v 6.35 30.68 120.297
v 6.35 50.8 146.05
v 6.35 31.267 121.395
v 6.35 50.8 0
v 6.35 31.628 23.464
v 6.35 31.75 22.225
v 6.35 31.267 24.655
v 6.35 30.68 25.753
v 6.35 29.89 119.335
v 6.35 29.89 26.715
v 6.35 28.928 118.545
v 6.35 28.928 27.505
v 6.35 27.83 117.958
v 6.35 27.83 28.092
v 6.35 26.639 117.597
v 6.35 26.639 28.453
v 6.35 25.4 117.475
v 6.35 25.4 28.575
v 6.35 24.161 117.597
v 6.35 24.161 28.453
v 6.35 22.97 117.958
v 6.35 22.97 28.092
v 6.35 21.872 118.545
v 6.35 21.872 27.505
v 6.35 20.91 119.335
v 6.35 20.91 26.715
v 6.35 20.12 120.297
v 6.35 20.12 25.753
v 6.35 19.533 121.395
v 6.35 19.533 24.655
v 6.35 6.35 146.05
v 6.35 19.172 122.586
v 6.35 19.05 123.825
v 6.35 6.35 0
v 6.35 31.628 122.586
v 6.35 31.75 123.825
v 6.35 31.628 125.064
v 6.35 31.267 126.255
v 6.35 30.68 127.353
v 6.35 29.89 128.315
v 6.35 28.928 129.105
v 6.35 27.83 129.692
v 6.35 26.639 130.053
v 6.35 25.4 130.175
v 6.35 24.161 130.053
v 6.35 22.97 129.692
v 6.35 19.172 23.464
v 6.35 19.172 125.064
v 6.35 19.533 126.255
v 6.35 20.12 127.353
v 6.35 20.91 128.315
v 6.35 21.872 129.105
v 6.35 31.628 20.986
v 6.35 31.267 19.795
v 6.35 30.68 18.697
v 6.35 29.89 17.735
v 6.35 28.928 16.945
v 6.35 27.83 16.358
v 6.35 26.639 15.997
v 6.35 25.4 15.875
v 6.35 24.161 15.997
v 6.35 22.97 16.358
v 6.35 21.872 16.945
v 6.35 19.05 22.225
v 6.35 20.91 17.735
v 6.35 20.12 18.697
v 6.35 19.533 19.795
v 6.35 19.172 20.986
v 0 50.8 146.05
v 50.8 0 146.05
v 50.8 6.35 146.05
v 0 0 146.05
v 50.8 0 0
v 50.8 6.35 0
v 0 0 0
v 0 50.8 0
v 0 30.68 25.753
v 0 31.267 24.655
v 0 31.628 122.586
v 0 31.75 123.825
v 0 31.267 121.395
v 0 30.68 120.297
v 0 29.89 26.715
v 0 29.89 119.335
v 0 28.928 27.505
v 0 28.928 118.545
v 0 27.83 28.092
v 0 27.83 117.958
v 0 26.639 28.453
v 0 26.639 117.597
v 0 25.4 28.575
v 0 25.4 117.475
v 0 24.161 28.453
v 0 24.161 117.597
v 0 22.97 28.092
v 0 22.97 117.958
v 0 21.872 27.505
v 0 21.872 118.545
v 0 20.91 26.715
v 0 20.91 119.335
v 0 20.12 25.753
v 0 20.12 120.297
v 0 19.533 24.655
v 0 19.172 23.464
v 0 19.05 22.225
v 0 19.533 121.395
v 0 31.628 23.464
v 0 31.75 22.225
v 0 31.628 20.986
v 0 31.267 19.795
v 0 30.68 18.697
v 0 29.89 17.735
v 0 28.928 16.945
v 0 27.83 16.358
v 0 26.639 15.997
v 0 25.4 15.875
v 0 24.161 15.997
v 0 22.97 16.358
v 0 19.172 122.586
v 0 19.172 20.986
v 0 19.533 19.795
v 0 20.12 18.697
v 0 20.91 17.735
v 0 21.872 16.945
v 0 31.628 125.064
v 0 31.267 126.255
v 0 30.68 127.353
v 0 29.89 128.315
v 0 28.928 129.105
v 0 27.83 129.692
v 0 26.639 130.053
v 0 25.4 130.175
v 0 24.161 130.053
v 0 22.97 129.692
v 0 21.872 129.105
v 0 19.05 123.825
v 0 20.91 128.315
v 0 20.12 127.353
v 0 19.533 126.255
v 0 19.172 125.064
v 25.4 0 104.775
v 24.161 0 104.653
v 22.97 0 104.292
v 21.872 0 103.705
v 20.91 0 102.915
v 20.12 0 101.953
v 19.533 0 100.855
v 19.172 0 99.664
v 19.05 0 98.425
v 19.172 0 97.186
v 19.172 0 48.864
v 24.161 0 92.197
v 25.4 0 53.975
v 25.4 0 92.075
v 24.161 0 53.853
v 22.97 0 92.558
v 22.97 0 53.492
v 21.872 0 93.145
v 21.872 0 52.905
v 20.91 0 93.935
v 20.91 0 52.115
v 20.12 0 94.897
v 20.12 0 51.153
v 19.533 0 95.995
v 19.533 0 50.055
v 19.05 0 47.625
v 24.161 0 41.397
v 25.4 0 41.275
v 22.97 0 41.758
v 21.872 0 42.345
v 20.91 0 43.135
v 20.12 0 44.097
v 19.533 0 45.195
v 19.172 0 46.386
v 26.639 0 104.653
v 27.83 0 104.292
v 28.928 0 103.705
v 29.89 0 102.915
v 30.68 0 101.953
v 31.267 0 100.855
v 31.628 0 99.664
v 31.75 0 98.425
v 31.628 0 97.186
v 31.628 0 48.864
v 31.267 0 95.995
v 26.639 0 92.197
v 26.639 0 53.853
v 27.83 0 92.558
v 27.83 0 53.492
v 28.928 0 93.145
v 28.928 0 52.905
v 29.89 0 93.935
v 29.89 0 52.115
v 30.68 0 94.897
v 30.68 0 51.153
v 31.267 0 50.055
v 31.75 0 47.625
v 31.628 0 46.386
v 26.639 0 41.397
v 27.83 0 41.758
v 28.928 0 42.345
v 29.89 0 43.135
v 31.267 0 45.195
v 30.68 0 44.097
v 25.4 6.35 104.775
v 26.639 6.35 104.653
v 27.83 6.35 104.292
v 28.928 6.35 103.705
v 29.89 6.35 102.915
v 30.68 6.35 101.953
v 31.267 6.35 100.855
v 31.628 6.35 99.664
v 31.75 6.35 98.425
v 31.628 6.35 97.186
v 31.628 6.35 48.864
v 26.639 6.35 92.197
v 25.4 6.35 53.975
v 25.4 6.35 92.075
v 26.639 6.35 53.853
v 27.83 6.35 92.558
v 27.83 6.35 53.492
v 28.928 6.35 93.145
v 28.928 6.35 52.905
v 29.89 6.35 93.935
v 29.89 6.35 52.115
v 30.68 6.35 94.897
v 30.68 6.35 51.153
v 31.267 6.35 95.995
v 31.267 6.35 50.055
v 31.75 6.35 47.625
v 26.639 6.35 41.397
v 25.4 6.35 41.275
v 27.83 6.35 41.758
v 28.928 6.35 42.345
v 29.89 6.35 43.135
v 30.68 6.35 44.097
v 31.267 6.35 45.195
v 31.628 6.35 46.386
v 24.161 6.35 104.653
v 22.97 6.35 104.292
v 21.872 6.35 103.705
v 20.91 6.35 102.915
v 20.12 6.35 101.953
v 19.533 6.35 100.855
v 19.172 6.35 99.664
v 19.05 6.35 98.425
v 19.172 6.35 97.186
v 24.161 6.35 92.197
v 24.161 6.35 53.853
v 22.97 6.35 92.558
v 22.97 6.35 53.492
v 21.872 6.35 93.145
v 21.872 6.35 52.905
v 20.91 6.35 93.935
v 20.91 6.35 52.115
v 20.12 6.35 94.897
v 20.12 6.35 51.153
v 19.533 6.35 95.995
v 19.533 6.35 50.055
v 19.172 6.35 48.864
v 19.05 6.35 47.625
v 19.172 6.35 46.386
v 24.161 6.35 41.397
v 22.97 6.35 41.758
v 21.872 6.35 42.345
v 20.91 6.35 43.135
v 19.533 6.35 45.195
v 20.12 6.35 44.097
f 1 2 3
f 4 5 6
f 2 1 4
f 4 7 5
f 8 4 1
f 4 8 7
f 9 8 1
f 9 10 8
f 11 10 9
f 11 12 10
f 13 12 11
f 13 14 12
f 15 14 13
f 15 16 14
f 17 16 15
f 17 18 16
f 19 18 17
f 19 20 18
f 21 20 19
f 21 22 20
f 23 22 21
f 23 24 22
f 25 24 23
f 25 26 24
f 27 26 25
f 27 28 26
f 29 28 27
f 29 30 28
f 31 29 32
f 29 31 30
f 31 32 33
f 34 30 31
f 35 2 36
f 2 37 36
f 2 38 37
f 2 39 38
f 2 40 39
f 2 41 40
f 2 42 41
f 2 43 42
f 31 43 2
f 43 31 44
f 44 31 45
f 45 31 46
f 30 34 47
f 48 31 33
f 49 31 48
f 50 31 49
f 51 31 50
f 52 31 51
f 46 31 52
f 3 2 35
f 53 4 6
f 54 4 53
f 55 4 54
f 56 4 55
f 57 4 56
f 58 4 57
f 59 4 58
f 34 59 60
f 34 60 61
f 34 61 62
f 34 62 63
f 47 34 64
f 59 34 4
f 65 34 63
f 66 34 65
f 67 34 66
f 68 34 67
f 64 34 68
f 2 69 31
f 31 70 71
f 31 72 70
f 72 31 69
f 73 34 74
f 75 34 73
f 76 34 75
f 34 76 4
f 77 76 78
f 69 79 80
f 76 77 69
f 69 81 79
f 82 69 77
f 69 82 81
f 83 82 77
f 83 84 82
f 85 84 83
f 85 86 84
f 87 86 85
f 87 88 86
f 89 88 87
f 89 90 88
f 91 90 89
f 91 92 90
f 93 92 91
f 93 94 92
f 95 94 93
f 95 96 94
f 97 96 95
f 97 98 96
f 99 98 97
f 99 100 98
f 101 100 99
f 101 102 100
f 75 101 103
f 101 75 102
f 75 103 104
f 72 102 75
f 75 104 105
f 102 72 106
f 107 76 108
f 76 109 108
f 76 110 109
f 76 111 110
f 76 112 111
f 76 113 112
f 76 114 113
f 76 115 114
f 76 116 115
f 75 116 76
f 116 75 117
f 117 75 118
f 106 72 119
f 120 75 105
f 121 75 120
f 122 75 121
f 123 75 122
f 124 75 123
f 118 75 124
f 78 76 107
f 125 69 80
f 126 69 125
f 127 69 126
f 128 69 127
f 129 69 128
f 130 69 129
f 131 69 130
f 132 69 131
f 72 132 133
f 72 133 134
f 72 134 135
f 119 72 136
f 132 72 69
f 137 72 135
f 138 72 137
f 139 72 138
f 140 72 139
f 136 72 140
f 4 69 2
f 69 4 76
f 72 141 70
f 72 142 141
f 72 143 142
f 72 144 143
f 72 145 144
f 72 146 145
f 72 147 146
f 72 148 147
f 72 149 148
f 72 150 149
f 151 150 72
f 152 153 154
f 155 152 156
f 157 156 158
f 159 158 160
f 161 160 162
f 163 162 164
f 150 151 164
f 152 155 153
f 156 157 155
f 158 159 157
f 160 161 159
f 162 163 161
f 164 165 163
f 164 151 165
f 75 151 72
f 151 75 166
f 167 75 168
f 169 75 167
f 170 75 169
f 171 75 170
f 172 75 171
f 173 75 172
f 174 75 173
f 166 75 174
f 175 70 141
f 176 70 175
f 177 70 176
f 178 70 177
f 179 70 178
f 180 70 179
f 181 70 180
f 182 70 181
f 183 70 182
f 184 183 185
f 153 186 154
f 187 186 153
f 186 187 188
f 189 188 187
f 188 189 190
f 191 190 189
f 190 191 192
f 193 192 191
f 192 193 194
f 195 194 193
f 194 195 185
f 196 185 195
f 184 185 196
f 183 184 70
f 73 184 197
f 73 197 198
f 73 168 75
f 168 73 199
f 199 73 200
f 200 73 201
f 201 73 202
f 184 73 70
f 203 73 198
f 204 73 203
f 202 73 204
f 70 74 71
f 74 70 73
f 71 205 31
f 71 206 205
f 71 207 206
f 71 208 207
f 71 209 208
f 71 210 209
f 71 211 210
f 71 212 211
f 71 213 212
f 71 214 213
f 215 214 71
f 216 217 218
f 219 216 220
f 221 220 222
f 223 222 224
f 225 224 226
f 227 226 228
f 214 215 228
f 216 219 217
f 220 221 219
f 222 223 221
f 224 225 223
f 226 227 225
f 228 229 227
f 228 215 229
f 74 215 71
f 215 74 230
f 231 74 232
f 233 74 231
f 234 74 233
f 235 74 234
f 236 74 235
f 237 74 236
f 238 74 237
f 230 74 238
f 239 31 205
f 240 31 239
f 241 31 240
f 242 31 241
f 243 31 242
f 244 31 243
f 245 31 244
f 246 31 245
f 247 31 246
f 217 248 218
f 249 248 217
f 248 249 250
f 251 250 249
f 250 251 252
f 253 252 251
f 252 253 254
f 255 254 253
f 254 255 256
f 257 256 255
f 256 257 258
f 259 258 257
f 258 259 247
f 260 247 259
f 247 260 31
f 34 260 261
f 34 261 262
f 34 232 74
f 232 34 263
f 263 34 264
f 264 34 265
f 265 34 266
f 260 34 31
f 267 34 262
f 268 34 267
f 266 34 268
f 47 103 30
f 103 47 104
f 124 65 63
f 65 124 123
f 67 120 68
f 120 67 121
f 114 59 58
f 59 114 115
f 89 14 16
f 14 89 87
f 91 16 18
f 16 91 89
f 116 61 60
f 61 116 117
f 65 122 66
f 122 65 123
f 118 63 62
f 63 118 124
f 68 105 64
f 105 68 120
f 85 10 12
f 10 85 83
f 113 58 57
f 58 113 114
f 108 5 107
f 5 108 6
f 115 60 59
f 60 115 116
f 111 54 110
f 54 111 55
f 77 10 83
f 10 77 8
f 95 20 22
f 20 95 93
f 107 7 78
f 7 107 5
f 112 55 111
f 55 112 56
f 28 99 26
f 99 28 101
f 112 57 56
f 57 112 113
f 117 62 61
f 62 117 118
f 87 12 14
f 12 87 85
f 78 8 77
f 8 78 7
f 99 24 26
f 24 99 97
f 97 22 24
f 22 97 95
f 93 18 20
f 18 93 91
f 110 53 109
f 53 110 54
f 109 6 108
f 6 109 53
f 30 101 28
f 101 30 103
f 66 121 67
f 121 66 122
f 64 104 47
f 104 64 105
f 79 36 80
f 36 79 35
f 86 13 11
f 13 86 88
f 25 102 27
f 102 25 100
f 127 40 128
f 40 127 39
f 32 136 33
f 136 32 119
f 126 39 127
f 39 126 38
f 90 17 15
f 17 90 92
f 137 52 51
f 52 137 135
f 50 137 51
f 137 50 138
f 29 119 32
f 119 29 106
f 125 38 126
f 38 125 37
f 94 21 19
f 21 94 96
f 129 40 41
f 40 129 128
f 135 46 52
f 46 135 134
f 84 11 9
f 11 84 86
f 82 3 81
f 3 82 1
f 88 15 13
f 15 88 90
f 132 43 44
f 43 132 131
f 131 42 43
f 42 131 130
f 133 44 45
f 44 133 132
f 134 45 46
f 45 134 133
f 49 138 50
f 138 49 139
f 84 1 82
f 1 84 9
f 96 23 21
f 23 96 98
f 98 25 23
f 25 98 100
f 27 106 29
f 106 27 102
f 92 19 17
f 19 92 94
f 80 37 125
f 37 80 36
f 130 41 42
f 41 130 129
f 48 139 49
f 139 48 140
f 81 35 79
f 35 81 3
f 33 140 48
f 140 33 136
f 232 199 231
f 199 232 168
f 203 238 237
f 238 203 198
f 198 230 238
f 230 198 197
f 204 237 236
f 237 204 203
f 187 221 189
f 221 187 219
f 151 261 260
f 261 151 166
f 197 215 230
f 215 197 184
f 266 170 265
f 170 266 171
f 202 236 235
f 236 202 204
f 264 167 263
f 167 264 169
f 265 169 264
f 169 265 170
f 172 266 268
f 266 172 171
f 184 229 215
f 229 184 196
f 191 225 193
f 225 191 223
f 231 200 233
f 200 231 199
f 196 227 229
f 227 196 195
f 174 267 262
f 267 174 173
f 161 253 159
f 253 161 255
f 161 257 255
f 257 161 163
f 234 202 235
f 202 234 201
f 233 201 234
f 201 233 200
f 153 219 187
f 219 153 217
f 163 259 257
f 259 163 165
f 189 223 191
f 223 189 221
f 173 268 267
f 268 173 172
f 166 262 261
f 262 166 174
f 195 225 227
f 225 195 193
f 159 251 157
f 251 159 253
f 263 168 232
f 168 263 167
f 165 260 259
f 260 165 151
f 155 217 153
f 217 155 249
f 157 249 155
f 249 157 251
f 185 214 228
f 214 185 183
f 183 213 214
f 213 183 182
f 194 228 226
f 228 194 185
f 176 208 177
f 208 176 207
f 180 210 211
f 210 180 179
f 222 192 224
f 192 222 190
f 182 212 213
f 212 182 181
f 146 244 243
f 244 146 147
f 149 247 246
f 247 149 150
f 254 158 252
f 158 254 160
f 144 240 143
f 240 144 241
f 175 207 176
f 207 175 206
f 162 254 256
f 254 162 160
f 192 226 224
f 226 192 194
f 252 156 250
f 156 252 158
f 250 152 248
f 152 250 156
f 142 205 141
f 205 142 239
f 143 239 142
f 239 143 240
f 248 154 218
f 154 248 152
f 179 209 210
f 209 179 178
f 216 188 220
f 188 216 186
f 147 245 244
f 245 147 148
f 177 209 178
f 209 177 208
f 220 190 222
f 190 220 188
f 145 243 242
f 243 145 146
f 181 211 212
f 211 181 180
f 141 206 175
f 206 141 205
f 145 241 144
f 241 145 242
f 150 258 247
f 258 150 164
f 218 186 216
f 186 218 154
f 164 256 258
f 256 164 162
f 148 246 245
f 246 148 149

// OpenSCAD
// Part A4: Frame Tube Mount Angle Iron
// Material: 2"×2"×1/4" Angle Iron (50.8mm × 6.35mm)
// Quantity: 16 pieces (2 tubes × 4 walls × 2 faces)
// Location: Mounting 2×6 cross frame tubes to wall panels
//
// This is the standard frame tube mounting angle with asymmetric hole spacing:
// - Wall side (Leg A): 4" spacing (2" from center) with 1/2" bolts
// - Tube side (Leg B): 2" spacing (1" from center) with 1/2" bolts

include <../../lifetrac_v25_params.scad>

// =============================================================================
// PART DIMENSIONS
// =============================================================================

// Frame tube height is 6" (152.4mm), angles are 1/8" shorter on each end
_frame_tube_height = 152.4;
_angle_trim = 3.175;  // 1/8" trim from each end

PART_A4_HEIGHT = _frame_tube_height - 2 * _angle_trim;  // 146.05mm (5.75")
PART_A4_LEG = 50.8;      // 2"
PART_A4_THICK = 6.35;    // 1/4"
PART_A4_BOLT_DIA = 12.7; // 1/2" bolts

// Hole positions (from bottom of angle)
_plate_bolt_offset = 50.8;  // 2" from center for wall side (4" total spacing)
_tube_bolt_offset = 25.4;   // 1" from center for tube side (2" total spacing)
_hole_inset = 25.4;         // 1" from corner for hole placement on tube leg

// Centered on height for both
_center_z = PART_A4_HEIGHT / 2;

// Leg A holes (against wall) - 4" spacing
PART_A4_HOLES_LEG_A = [_center_z - _plate_bolt_offset, _center_z + _plate_bolt_offset];

// Leg B holes (against tube) - 2" spacing, inset from corner
PART_A4_HOLES_LEG_B = [_center_z - _tube_bolt_offset, _center_z + _tube_bolt_offset];
PART_A4_TUBE_HOLE_INSET = _hole_inset;

// =============================================================================
// MAIN MODULE
// =============================================================================

/**
 * Part A4: Frame Tube Mount Angle Iron
 * 
 * Orientation when installed:
 *   - Vertical leg against wall panel (bolts in X direction)
 *   - Horizontal leg against frame tube (bolts in Y direction)
 *   - Extrusion runs vertically along Z
 *
 * Hole pattern:
 *   - Leg A (wall): 2 holes, 4" apart, 1/2" bolts
 *   - Leg B (tube): 2 holes, 2" apart, 1/2" bolts, 1" from corner
 */
module _part_a4_frame_tube_mount(show_holes=true) {
    height = PART_A4_HEIGHT;
    leg = PART_A4_LEG;
    thick = PART_A4_THICK;
    bolt_dia = PART_A4_BOLT_DIA;
    
    color("DarkGray")
    difference() {
        union() {
            // Vertical leg (against wall panel) - runs full height in Z, thin in X
            cube([thick, leg, height]);
            // Horizontal leg (toward tube) - extends in +X direction
            cube([leg, thick, height]);
        }
        
        if (show_holes) {
            // Holes in vertical leg (bolts through to wall plate in X direction)
            for (z = PART_A4_HOLES_LEG_A) {
                translate([-1, leg/2, z])
                rotate([0, 90, 0])
                cylinder(d=bolt_dia, h=thick+2, $fn=32);
            }
            
            // Holes in horizontal leg (bolts through in Y direction into tube side)
            for (z = PART_A4_HOLES_LEG_B) {
                translate([PART_A4_TUBE_HOLE_INSET, -1, z])
                rotate([-90, 0, 0])
                cylinder(d=bolt_dia, h=thick+2, $fn=32);
            }
        }
    }
}

// =============================================================================
// RENDER
// =============================================================================

_part_a4_frame_tube_mount(show_holes=true);

echo("=== PART A4: Frame Tube Mount Angle Iron ===");
echo("Height:", PART_A4_HEIGHT, "mm (", PART_A4_HEIGHT/25.4, "inches)");
echo("Bolt diameter:", PART_A4_BOLT_DIA, "mm (1/2\")");
echo("Wall side spacing: 4\" (101.6mm)");
echo("Tube side spacing: 2\" (50.8mm)");
echo("Quantity needed: 16 pieces");
